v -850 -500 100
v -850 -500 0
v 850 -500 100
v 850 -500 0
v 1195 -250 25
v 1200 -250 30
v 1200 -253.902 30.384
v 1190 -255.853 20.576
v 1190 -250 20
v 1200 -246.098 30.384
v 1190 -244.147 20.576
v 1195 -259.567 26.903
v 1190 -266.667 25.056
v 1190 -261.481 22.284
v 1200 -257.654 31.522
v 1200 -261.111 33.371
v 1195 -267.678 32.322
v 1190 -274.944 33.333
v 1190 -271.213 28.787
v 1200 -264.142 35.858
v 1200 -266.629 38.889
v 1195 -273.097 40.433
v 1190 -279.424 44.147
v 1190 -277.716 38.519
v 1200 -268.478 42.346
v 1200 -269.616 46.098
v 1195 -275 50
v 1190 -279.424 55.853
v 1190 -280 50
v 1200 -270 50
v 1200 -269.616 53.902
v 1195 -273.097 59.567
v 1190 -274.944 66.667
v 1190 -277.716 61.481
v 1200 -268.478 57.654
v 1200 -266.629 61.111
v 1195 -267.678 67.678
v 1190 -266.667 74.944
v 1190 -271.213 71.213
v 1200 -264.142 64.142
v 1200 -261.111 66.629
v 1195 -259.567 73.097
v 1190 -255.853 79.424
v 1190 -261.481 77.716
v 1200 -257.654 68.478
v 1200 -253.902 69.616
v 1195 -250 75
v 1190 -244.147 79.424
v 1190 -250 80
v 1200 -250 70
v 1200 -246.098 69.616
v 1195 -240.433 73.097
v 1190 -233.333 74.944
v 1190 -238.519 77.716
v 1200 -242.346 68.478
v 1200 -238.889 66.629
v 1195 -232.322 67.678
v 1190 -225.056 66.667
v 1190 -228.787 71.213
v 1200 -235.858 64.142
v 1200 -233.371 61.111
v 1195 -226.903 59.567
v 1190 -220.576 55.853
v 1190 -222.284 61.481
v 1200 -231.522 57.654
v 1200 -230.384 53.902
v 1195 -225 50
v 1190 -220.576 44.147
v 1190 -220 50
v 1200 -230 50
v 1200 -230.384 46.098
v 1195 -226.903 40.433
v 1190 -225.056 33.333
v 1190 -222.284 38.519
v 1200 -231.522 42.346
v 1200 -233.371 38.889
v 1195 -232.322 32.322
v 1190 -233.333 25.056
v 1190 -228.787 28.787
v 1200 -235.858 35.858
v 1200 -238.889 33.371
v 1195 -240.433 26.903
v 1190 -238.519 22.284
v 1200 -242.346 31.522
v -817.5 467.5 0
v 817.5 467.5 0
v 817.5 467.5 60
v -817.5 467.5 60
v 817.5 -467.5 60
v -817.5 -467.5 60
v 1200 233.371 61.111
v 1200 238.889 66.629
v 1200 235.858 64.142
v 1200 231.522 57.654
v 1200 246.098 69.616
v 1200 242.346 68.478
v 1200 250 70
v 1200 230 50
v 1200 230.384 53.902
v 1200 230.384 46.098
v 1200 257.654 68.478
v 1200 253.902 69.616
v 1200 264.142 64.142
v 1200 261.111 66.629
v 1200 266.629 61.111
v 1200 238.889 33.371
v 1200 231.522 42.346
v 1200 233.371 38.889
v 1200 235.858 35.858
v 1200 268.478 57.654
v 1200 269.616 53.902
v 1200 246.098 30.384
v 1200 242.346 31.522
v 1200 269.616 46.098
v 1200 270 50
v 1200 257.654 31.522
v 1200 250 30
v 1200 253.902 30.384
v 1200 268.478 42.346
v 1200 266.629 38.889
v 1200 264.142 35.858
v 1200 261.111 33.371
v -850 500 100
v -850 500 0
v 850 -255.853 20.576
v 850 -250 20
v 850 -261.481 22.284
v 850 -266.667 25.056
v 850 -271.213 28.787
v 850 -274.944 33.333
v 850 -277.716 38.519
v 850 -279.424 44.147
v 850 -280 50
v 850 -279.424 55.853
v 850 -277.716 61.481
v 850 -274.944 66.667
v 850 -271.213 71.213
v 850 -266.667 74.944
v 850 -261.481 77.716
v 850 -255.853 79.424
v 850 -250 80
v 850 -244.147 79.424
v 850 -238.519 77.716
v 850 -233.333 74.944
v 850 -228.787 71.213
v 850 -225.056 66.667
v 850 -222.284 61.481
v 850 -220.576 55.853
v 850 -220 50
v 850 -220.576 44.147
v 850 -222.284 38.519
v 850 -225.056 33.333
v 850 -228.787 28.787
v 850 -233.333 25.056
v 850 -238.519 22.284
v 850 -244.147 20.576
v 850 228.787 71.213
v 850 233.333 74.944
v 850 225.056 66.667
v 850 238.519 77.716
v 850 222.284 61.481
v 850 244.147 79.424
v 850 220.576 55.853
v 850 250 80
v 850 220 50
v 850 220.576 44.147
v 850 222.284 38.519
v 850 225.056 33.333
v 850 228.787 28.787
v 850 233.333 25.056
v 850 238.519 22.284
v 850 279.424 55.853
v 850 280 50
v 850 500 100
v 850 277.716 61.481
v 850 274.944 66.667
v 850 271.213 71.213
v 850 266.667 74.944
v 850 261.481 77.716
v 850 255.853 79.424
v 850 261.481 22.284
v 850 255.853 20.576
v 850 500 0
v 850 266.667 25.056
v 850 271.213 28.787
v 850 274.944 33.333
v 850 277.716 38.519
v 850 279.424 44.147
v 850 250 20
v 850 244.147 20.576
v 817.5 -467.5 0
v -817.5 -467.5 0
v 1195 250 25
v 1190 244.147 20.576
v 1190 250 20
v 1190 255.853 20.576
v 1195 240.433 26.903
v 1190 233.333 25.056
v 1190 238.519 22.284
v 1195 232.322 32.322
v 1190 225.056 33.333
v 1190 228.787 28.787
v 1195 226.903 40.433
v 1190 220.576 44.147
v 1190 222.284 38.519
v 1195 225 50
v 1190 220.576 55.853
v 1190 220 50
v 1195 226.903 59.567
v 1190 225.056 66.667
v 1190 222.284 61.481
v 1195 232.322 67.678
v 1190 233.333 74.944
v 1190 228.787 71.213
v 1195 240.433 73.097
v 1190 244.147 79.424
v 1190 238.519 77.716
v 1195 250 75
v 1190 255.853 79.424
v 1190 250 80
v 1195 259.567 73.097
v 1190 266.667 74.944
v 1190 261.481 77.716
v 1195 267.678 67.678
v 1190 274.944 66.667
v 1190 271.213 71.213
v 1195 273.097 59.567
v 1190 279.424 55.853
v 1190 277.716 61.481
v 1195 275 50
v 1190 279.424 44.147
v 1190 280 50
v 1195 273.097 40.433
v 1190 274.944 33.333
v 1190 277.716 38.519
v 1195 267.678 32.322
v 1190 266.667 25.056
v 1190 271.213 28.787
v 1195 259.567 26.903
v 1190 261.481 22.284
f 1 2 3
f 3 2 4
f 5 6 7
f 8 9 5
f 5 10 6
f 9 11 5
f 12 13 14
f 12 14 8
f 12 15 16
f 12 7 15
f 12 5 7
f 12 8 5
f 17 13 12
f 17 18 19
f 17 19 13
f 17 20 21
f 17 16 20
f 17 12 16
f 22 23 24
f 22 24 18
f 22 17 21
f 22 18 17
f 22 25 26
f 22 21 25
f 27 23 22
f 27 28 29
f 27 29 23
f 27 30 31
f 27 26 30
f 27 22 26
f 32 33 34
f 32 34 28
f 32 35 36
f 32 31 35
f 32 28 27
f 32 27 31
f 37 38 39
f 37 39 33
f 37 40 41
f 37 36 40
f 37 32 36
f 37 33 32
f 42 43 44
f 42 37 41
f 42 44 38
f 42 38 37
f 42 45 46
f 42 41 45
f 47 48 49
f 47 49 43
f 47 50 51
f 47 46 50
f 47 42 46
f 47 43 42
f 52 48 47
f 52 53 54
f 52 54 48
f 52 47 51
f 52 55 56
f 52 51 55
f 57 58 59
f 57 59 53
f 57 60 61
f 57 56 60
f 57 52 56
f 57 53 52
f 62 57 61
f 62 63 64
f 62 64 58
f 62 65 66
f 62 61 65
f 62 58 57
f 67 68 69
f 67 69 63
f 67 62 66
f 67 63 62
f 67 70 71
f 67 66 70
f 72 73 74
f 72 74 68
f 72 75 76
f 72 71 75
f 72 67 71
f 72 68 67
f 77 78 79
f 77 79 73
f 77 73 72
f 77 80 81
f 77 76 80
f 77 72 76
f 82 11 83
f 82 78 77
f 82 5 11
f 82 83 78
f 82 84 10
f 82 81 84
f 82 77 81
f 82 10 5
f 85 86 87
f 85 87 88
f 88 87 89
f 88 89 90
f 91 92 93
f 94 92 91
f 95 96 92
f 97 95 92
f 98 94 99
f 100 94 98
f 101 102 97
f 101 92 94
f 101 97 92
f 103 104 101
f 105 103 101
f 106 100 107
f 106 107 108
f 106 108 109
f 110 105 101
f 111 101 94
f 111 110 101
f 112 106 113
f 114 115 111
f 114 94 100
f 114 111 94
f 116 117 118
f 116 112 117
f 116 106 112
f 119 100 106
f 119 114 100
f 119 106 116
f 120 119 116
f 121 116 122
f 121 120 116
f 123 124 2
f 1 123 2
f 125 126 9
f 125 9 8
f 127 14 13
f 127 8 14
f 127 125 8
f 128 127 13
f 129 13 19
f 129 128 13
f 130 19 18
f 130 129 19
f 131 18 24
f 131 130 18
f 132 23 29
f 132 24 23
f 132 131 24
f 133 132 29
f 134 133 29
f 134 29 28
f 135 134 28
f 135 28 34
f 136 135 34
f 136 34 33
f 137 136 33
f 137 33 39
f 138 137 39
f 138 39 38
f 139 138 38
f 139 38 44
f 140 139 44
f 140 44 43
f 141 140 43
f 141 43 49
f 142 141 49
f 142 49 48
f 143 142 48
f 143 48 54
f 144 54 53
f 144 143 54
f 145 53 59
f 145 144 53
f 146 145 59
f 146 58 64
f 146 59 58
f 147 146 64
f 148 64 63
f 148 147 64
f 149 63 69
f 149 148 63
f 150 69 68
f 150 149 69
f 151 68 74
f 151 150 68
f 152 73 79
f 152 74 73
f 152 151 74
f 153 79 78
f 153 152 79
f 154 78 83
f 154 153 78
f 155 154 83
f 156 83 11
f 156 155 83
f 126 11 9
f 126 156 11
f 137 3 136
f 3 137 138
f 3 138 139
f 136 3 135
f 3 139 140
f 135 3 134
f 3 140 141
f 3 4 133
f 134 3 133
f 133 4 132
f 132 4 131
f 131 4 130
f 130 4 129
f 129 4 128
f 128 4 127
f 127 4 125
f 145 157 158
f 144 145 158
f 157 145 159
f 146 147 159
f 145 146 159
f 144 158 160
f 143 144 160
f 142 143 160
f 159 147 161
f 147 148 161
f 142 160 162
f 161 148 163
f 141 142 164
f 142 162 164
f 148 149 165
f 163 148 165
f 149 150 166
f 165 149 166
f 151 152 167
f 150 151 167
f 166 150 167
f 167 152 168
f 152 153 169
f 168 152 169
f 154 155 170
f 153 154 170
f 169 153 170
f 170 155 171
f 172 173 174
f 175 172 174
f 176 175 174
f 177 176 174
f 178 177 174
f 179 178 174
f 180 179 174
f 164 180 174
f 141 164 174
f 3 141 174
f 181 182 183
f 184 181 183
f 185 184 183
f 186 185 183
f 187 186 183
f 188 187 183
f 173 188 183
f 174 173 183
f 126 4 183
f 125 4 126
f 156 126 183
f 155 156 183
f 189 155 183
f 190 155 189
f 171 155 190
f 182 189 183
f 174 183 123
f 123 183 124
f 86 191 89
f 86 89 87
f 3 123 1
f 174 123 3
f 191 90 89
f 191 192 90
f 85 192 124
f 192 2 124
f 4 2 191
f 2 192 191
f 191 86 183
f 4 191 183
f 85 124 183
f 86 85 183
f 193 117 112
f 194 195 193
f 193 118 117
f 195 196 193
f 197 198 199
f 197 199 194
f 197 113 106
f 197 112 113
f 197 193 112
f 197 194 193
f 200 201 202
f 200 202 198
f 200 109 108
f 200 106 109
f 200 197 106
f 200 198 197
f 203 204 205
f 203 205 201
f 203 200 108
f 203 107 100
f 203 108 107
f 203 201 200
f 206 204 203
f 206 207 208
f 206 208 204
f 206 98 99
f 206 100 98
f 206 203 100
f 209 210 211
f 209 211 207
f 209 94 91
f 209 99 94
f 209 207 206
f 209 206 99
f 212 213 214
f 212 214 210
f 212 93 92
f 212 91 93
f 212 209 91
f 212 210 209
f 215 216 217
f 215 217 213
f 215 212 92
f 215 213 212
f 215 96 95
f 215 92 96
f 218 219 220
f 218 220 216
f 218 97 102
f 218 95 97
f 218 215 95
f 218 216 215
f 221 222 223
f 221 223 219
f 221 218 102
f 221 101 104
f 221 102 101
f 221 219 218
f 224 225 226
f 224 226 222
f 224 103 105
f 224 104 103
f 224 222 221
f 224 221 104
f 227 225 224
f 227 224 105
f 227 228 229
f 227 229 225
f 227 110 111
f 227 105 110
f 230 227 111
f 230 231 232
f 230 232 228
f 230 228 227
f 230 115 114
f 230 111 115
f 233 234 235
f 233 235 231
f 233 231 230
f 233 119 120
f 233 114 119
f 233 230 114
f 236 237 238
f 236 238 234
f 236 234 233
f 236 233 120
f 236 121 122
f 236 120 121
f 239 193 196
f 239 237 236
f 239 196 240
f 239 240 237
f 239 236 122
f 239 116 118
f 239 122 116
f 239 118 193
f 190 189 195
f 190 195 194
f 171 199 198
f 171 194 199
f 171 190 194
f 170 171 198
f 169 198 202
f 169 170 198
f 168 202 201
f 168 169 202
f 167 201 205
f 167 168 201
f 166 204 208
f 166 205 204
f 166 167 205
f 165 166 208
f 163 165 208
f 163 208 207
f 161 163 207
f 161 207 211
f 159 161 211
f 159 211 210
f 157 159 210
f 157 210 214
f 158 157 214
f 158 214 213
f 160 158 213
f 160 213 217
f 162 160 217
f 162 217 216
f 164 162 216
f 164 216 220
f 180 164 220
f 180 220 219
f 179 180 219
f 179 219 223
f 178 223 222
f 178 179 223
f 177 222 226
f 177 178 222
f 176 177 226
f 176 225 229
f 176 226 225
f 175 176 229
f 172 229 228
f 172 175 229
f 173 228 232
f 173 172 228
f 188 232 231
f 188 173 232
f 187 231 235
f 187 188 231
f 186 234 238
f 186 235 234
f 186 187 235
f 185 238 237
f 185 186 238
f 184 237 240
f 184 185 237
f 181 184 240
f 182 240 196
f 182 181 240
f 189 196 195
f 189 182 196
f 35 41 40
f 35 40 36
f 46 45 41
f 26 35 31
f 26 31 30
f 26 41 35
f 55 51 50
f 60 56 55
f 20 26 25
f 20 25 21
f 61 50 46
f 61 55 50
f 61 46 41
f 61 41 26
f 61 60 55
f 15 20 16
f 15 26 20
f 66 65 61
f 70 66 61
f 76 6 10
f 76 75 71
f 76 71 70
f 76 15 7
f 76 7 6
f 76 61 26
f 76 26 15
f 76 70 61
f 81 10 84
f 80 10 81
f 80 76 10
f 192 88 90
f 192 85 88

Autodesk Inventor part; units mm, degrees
ref_plane "YZ Plane" through (0, 0, 0) normal (1, 0, 0) x (0, 1, 0)
ref_plane "XZ Plane" through (0, 0, 0) normal (0, 1, 0) x (-1, 0, 0)
ref_plane "XY Plane" through (0, 0, 0) normal (0, 0, 1) x (1, 0, 0)
sketch "Sketch1" plane through (0, 0, 0) normal (0, 0, 1) x (1, 0, 0)
  line L0 (-850, -500) -> (850, -500)
  line L1 (850, -500) -> (850, 500)
  line L2 (850, 500) -> (-850, 500)
  line L3 (-850, 500) -> (-850, -500)
  line L4 (-850, -500) -> (850, 500) construction
  line L5 (850, -500) -> (-850, 500) construction
  point P0 (0, 0)
  dimension "d0" = 1700
  dimension "d1" = 1000
extrude "Extrusion1" add sketch "Sketch1" along normal blind 100
sketch "Sketch2" plane through (0, 0, 0) normal (0, 0, -1) x (-1, 0, 0)
  line L0 (-817.5, 467.5) -> (817.5, 467.5)
  line L1 (817.5, 467.5) -> (817.5, -467.5)
  line L2 (817.5, -467.5) -> (-817.5, -467.5)
  line L3 (-817.5, -467.5) -> (-817.5, 467.5)
  line L4 (-817.5, 467.5) -> (817.5, -467.5) construction
  line L5 (817.5, 467.5) -> (-817.5, -467.5) construction
  line L6 (850, 500) -> (850, -500) projected
  line L7 (850, -500) -> (-850, -500) projected
  point P0 (0, 0)
  dimension "d4" = 32.5
  dimension "d5" = 32.5
extrude "Extrusion2" cut sketch "Sketch2" against normal blind 60
sketch "Sketch3" plane through (850, -500, 0) normal (1, 0, 0) x (0, 0, -1)
  circle A0 centre (-50, 250) radius 30
  circle A1 centre (-50, 750) radius 30
  point P0 (0, 500)
  dimension "d8" = 60
  dimension "d9" = 60
extrude "Extrusion3" add sketch "Sketch3" along normal blind 350 contours A0
sketch "Sketch4" plane through (850, -500, 0) normal (1, 0, 0) x (0, 0, -1)
  circle A0 centre (-50, 750) radius 30
  point P0 (0, 500)
  dimension "d12" = 60
extrude "Extrusion4" add sketch "Sketch4" along normal blind 350
chamfer "Chamfer1" distance 10 angle 45 1 edges at (1200, -250, 80)
chamfer "Chamfer2" distance 10 angle 45 1 edges at (1200, 250, 80)
properties part number "top"
